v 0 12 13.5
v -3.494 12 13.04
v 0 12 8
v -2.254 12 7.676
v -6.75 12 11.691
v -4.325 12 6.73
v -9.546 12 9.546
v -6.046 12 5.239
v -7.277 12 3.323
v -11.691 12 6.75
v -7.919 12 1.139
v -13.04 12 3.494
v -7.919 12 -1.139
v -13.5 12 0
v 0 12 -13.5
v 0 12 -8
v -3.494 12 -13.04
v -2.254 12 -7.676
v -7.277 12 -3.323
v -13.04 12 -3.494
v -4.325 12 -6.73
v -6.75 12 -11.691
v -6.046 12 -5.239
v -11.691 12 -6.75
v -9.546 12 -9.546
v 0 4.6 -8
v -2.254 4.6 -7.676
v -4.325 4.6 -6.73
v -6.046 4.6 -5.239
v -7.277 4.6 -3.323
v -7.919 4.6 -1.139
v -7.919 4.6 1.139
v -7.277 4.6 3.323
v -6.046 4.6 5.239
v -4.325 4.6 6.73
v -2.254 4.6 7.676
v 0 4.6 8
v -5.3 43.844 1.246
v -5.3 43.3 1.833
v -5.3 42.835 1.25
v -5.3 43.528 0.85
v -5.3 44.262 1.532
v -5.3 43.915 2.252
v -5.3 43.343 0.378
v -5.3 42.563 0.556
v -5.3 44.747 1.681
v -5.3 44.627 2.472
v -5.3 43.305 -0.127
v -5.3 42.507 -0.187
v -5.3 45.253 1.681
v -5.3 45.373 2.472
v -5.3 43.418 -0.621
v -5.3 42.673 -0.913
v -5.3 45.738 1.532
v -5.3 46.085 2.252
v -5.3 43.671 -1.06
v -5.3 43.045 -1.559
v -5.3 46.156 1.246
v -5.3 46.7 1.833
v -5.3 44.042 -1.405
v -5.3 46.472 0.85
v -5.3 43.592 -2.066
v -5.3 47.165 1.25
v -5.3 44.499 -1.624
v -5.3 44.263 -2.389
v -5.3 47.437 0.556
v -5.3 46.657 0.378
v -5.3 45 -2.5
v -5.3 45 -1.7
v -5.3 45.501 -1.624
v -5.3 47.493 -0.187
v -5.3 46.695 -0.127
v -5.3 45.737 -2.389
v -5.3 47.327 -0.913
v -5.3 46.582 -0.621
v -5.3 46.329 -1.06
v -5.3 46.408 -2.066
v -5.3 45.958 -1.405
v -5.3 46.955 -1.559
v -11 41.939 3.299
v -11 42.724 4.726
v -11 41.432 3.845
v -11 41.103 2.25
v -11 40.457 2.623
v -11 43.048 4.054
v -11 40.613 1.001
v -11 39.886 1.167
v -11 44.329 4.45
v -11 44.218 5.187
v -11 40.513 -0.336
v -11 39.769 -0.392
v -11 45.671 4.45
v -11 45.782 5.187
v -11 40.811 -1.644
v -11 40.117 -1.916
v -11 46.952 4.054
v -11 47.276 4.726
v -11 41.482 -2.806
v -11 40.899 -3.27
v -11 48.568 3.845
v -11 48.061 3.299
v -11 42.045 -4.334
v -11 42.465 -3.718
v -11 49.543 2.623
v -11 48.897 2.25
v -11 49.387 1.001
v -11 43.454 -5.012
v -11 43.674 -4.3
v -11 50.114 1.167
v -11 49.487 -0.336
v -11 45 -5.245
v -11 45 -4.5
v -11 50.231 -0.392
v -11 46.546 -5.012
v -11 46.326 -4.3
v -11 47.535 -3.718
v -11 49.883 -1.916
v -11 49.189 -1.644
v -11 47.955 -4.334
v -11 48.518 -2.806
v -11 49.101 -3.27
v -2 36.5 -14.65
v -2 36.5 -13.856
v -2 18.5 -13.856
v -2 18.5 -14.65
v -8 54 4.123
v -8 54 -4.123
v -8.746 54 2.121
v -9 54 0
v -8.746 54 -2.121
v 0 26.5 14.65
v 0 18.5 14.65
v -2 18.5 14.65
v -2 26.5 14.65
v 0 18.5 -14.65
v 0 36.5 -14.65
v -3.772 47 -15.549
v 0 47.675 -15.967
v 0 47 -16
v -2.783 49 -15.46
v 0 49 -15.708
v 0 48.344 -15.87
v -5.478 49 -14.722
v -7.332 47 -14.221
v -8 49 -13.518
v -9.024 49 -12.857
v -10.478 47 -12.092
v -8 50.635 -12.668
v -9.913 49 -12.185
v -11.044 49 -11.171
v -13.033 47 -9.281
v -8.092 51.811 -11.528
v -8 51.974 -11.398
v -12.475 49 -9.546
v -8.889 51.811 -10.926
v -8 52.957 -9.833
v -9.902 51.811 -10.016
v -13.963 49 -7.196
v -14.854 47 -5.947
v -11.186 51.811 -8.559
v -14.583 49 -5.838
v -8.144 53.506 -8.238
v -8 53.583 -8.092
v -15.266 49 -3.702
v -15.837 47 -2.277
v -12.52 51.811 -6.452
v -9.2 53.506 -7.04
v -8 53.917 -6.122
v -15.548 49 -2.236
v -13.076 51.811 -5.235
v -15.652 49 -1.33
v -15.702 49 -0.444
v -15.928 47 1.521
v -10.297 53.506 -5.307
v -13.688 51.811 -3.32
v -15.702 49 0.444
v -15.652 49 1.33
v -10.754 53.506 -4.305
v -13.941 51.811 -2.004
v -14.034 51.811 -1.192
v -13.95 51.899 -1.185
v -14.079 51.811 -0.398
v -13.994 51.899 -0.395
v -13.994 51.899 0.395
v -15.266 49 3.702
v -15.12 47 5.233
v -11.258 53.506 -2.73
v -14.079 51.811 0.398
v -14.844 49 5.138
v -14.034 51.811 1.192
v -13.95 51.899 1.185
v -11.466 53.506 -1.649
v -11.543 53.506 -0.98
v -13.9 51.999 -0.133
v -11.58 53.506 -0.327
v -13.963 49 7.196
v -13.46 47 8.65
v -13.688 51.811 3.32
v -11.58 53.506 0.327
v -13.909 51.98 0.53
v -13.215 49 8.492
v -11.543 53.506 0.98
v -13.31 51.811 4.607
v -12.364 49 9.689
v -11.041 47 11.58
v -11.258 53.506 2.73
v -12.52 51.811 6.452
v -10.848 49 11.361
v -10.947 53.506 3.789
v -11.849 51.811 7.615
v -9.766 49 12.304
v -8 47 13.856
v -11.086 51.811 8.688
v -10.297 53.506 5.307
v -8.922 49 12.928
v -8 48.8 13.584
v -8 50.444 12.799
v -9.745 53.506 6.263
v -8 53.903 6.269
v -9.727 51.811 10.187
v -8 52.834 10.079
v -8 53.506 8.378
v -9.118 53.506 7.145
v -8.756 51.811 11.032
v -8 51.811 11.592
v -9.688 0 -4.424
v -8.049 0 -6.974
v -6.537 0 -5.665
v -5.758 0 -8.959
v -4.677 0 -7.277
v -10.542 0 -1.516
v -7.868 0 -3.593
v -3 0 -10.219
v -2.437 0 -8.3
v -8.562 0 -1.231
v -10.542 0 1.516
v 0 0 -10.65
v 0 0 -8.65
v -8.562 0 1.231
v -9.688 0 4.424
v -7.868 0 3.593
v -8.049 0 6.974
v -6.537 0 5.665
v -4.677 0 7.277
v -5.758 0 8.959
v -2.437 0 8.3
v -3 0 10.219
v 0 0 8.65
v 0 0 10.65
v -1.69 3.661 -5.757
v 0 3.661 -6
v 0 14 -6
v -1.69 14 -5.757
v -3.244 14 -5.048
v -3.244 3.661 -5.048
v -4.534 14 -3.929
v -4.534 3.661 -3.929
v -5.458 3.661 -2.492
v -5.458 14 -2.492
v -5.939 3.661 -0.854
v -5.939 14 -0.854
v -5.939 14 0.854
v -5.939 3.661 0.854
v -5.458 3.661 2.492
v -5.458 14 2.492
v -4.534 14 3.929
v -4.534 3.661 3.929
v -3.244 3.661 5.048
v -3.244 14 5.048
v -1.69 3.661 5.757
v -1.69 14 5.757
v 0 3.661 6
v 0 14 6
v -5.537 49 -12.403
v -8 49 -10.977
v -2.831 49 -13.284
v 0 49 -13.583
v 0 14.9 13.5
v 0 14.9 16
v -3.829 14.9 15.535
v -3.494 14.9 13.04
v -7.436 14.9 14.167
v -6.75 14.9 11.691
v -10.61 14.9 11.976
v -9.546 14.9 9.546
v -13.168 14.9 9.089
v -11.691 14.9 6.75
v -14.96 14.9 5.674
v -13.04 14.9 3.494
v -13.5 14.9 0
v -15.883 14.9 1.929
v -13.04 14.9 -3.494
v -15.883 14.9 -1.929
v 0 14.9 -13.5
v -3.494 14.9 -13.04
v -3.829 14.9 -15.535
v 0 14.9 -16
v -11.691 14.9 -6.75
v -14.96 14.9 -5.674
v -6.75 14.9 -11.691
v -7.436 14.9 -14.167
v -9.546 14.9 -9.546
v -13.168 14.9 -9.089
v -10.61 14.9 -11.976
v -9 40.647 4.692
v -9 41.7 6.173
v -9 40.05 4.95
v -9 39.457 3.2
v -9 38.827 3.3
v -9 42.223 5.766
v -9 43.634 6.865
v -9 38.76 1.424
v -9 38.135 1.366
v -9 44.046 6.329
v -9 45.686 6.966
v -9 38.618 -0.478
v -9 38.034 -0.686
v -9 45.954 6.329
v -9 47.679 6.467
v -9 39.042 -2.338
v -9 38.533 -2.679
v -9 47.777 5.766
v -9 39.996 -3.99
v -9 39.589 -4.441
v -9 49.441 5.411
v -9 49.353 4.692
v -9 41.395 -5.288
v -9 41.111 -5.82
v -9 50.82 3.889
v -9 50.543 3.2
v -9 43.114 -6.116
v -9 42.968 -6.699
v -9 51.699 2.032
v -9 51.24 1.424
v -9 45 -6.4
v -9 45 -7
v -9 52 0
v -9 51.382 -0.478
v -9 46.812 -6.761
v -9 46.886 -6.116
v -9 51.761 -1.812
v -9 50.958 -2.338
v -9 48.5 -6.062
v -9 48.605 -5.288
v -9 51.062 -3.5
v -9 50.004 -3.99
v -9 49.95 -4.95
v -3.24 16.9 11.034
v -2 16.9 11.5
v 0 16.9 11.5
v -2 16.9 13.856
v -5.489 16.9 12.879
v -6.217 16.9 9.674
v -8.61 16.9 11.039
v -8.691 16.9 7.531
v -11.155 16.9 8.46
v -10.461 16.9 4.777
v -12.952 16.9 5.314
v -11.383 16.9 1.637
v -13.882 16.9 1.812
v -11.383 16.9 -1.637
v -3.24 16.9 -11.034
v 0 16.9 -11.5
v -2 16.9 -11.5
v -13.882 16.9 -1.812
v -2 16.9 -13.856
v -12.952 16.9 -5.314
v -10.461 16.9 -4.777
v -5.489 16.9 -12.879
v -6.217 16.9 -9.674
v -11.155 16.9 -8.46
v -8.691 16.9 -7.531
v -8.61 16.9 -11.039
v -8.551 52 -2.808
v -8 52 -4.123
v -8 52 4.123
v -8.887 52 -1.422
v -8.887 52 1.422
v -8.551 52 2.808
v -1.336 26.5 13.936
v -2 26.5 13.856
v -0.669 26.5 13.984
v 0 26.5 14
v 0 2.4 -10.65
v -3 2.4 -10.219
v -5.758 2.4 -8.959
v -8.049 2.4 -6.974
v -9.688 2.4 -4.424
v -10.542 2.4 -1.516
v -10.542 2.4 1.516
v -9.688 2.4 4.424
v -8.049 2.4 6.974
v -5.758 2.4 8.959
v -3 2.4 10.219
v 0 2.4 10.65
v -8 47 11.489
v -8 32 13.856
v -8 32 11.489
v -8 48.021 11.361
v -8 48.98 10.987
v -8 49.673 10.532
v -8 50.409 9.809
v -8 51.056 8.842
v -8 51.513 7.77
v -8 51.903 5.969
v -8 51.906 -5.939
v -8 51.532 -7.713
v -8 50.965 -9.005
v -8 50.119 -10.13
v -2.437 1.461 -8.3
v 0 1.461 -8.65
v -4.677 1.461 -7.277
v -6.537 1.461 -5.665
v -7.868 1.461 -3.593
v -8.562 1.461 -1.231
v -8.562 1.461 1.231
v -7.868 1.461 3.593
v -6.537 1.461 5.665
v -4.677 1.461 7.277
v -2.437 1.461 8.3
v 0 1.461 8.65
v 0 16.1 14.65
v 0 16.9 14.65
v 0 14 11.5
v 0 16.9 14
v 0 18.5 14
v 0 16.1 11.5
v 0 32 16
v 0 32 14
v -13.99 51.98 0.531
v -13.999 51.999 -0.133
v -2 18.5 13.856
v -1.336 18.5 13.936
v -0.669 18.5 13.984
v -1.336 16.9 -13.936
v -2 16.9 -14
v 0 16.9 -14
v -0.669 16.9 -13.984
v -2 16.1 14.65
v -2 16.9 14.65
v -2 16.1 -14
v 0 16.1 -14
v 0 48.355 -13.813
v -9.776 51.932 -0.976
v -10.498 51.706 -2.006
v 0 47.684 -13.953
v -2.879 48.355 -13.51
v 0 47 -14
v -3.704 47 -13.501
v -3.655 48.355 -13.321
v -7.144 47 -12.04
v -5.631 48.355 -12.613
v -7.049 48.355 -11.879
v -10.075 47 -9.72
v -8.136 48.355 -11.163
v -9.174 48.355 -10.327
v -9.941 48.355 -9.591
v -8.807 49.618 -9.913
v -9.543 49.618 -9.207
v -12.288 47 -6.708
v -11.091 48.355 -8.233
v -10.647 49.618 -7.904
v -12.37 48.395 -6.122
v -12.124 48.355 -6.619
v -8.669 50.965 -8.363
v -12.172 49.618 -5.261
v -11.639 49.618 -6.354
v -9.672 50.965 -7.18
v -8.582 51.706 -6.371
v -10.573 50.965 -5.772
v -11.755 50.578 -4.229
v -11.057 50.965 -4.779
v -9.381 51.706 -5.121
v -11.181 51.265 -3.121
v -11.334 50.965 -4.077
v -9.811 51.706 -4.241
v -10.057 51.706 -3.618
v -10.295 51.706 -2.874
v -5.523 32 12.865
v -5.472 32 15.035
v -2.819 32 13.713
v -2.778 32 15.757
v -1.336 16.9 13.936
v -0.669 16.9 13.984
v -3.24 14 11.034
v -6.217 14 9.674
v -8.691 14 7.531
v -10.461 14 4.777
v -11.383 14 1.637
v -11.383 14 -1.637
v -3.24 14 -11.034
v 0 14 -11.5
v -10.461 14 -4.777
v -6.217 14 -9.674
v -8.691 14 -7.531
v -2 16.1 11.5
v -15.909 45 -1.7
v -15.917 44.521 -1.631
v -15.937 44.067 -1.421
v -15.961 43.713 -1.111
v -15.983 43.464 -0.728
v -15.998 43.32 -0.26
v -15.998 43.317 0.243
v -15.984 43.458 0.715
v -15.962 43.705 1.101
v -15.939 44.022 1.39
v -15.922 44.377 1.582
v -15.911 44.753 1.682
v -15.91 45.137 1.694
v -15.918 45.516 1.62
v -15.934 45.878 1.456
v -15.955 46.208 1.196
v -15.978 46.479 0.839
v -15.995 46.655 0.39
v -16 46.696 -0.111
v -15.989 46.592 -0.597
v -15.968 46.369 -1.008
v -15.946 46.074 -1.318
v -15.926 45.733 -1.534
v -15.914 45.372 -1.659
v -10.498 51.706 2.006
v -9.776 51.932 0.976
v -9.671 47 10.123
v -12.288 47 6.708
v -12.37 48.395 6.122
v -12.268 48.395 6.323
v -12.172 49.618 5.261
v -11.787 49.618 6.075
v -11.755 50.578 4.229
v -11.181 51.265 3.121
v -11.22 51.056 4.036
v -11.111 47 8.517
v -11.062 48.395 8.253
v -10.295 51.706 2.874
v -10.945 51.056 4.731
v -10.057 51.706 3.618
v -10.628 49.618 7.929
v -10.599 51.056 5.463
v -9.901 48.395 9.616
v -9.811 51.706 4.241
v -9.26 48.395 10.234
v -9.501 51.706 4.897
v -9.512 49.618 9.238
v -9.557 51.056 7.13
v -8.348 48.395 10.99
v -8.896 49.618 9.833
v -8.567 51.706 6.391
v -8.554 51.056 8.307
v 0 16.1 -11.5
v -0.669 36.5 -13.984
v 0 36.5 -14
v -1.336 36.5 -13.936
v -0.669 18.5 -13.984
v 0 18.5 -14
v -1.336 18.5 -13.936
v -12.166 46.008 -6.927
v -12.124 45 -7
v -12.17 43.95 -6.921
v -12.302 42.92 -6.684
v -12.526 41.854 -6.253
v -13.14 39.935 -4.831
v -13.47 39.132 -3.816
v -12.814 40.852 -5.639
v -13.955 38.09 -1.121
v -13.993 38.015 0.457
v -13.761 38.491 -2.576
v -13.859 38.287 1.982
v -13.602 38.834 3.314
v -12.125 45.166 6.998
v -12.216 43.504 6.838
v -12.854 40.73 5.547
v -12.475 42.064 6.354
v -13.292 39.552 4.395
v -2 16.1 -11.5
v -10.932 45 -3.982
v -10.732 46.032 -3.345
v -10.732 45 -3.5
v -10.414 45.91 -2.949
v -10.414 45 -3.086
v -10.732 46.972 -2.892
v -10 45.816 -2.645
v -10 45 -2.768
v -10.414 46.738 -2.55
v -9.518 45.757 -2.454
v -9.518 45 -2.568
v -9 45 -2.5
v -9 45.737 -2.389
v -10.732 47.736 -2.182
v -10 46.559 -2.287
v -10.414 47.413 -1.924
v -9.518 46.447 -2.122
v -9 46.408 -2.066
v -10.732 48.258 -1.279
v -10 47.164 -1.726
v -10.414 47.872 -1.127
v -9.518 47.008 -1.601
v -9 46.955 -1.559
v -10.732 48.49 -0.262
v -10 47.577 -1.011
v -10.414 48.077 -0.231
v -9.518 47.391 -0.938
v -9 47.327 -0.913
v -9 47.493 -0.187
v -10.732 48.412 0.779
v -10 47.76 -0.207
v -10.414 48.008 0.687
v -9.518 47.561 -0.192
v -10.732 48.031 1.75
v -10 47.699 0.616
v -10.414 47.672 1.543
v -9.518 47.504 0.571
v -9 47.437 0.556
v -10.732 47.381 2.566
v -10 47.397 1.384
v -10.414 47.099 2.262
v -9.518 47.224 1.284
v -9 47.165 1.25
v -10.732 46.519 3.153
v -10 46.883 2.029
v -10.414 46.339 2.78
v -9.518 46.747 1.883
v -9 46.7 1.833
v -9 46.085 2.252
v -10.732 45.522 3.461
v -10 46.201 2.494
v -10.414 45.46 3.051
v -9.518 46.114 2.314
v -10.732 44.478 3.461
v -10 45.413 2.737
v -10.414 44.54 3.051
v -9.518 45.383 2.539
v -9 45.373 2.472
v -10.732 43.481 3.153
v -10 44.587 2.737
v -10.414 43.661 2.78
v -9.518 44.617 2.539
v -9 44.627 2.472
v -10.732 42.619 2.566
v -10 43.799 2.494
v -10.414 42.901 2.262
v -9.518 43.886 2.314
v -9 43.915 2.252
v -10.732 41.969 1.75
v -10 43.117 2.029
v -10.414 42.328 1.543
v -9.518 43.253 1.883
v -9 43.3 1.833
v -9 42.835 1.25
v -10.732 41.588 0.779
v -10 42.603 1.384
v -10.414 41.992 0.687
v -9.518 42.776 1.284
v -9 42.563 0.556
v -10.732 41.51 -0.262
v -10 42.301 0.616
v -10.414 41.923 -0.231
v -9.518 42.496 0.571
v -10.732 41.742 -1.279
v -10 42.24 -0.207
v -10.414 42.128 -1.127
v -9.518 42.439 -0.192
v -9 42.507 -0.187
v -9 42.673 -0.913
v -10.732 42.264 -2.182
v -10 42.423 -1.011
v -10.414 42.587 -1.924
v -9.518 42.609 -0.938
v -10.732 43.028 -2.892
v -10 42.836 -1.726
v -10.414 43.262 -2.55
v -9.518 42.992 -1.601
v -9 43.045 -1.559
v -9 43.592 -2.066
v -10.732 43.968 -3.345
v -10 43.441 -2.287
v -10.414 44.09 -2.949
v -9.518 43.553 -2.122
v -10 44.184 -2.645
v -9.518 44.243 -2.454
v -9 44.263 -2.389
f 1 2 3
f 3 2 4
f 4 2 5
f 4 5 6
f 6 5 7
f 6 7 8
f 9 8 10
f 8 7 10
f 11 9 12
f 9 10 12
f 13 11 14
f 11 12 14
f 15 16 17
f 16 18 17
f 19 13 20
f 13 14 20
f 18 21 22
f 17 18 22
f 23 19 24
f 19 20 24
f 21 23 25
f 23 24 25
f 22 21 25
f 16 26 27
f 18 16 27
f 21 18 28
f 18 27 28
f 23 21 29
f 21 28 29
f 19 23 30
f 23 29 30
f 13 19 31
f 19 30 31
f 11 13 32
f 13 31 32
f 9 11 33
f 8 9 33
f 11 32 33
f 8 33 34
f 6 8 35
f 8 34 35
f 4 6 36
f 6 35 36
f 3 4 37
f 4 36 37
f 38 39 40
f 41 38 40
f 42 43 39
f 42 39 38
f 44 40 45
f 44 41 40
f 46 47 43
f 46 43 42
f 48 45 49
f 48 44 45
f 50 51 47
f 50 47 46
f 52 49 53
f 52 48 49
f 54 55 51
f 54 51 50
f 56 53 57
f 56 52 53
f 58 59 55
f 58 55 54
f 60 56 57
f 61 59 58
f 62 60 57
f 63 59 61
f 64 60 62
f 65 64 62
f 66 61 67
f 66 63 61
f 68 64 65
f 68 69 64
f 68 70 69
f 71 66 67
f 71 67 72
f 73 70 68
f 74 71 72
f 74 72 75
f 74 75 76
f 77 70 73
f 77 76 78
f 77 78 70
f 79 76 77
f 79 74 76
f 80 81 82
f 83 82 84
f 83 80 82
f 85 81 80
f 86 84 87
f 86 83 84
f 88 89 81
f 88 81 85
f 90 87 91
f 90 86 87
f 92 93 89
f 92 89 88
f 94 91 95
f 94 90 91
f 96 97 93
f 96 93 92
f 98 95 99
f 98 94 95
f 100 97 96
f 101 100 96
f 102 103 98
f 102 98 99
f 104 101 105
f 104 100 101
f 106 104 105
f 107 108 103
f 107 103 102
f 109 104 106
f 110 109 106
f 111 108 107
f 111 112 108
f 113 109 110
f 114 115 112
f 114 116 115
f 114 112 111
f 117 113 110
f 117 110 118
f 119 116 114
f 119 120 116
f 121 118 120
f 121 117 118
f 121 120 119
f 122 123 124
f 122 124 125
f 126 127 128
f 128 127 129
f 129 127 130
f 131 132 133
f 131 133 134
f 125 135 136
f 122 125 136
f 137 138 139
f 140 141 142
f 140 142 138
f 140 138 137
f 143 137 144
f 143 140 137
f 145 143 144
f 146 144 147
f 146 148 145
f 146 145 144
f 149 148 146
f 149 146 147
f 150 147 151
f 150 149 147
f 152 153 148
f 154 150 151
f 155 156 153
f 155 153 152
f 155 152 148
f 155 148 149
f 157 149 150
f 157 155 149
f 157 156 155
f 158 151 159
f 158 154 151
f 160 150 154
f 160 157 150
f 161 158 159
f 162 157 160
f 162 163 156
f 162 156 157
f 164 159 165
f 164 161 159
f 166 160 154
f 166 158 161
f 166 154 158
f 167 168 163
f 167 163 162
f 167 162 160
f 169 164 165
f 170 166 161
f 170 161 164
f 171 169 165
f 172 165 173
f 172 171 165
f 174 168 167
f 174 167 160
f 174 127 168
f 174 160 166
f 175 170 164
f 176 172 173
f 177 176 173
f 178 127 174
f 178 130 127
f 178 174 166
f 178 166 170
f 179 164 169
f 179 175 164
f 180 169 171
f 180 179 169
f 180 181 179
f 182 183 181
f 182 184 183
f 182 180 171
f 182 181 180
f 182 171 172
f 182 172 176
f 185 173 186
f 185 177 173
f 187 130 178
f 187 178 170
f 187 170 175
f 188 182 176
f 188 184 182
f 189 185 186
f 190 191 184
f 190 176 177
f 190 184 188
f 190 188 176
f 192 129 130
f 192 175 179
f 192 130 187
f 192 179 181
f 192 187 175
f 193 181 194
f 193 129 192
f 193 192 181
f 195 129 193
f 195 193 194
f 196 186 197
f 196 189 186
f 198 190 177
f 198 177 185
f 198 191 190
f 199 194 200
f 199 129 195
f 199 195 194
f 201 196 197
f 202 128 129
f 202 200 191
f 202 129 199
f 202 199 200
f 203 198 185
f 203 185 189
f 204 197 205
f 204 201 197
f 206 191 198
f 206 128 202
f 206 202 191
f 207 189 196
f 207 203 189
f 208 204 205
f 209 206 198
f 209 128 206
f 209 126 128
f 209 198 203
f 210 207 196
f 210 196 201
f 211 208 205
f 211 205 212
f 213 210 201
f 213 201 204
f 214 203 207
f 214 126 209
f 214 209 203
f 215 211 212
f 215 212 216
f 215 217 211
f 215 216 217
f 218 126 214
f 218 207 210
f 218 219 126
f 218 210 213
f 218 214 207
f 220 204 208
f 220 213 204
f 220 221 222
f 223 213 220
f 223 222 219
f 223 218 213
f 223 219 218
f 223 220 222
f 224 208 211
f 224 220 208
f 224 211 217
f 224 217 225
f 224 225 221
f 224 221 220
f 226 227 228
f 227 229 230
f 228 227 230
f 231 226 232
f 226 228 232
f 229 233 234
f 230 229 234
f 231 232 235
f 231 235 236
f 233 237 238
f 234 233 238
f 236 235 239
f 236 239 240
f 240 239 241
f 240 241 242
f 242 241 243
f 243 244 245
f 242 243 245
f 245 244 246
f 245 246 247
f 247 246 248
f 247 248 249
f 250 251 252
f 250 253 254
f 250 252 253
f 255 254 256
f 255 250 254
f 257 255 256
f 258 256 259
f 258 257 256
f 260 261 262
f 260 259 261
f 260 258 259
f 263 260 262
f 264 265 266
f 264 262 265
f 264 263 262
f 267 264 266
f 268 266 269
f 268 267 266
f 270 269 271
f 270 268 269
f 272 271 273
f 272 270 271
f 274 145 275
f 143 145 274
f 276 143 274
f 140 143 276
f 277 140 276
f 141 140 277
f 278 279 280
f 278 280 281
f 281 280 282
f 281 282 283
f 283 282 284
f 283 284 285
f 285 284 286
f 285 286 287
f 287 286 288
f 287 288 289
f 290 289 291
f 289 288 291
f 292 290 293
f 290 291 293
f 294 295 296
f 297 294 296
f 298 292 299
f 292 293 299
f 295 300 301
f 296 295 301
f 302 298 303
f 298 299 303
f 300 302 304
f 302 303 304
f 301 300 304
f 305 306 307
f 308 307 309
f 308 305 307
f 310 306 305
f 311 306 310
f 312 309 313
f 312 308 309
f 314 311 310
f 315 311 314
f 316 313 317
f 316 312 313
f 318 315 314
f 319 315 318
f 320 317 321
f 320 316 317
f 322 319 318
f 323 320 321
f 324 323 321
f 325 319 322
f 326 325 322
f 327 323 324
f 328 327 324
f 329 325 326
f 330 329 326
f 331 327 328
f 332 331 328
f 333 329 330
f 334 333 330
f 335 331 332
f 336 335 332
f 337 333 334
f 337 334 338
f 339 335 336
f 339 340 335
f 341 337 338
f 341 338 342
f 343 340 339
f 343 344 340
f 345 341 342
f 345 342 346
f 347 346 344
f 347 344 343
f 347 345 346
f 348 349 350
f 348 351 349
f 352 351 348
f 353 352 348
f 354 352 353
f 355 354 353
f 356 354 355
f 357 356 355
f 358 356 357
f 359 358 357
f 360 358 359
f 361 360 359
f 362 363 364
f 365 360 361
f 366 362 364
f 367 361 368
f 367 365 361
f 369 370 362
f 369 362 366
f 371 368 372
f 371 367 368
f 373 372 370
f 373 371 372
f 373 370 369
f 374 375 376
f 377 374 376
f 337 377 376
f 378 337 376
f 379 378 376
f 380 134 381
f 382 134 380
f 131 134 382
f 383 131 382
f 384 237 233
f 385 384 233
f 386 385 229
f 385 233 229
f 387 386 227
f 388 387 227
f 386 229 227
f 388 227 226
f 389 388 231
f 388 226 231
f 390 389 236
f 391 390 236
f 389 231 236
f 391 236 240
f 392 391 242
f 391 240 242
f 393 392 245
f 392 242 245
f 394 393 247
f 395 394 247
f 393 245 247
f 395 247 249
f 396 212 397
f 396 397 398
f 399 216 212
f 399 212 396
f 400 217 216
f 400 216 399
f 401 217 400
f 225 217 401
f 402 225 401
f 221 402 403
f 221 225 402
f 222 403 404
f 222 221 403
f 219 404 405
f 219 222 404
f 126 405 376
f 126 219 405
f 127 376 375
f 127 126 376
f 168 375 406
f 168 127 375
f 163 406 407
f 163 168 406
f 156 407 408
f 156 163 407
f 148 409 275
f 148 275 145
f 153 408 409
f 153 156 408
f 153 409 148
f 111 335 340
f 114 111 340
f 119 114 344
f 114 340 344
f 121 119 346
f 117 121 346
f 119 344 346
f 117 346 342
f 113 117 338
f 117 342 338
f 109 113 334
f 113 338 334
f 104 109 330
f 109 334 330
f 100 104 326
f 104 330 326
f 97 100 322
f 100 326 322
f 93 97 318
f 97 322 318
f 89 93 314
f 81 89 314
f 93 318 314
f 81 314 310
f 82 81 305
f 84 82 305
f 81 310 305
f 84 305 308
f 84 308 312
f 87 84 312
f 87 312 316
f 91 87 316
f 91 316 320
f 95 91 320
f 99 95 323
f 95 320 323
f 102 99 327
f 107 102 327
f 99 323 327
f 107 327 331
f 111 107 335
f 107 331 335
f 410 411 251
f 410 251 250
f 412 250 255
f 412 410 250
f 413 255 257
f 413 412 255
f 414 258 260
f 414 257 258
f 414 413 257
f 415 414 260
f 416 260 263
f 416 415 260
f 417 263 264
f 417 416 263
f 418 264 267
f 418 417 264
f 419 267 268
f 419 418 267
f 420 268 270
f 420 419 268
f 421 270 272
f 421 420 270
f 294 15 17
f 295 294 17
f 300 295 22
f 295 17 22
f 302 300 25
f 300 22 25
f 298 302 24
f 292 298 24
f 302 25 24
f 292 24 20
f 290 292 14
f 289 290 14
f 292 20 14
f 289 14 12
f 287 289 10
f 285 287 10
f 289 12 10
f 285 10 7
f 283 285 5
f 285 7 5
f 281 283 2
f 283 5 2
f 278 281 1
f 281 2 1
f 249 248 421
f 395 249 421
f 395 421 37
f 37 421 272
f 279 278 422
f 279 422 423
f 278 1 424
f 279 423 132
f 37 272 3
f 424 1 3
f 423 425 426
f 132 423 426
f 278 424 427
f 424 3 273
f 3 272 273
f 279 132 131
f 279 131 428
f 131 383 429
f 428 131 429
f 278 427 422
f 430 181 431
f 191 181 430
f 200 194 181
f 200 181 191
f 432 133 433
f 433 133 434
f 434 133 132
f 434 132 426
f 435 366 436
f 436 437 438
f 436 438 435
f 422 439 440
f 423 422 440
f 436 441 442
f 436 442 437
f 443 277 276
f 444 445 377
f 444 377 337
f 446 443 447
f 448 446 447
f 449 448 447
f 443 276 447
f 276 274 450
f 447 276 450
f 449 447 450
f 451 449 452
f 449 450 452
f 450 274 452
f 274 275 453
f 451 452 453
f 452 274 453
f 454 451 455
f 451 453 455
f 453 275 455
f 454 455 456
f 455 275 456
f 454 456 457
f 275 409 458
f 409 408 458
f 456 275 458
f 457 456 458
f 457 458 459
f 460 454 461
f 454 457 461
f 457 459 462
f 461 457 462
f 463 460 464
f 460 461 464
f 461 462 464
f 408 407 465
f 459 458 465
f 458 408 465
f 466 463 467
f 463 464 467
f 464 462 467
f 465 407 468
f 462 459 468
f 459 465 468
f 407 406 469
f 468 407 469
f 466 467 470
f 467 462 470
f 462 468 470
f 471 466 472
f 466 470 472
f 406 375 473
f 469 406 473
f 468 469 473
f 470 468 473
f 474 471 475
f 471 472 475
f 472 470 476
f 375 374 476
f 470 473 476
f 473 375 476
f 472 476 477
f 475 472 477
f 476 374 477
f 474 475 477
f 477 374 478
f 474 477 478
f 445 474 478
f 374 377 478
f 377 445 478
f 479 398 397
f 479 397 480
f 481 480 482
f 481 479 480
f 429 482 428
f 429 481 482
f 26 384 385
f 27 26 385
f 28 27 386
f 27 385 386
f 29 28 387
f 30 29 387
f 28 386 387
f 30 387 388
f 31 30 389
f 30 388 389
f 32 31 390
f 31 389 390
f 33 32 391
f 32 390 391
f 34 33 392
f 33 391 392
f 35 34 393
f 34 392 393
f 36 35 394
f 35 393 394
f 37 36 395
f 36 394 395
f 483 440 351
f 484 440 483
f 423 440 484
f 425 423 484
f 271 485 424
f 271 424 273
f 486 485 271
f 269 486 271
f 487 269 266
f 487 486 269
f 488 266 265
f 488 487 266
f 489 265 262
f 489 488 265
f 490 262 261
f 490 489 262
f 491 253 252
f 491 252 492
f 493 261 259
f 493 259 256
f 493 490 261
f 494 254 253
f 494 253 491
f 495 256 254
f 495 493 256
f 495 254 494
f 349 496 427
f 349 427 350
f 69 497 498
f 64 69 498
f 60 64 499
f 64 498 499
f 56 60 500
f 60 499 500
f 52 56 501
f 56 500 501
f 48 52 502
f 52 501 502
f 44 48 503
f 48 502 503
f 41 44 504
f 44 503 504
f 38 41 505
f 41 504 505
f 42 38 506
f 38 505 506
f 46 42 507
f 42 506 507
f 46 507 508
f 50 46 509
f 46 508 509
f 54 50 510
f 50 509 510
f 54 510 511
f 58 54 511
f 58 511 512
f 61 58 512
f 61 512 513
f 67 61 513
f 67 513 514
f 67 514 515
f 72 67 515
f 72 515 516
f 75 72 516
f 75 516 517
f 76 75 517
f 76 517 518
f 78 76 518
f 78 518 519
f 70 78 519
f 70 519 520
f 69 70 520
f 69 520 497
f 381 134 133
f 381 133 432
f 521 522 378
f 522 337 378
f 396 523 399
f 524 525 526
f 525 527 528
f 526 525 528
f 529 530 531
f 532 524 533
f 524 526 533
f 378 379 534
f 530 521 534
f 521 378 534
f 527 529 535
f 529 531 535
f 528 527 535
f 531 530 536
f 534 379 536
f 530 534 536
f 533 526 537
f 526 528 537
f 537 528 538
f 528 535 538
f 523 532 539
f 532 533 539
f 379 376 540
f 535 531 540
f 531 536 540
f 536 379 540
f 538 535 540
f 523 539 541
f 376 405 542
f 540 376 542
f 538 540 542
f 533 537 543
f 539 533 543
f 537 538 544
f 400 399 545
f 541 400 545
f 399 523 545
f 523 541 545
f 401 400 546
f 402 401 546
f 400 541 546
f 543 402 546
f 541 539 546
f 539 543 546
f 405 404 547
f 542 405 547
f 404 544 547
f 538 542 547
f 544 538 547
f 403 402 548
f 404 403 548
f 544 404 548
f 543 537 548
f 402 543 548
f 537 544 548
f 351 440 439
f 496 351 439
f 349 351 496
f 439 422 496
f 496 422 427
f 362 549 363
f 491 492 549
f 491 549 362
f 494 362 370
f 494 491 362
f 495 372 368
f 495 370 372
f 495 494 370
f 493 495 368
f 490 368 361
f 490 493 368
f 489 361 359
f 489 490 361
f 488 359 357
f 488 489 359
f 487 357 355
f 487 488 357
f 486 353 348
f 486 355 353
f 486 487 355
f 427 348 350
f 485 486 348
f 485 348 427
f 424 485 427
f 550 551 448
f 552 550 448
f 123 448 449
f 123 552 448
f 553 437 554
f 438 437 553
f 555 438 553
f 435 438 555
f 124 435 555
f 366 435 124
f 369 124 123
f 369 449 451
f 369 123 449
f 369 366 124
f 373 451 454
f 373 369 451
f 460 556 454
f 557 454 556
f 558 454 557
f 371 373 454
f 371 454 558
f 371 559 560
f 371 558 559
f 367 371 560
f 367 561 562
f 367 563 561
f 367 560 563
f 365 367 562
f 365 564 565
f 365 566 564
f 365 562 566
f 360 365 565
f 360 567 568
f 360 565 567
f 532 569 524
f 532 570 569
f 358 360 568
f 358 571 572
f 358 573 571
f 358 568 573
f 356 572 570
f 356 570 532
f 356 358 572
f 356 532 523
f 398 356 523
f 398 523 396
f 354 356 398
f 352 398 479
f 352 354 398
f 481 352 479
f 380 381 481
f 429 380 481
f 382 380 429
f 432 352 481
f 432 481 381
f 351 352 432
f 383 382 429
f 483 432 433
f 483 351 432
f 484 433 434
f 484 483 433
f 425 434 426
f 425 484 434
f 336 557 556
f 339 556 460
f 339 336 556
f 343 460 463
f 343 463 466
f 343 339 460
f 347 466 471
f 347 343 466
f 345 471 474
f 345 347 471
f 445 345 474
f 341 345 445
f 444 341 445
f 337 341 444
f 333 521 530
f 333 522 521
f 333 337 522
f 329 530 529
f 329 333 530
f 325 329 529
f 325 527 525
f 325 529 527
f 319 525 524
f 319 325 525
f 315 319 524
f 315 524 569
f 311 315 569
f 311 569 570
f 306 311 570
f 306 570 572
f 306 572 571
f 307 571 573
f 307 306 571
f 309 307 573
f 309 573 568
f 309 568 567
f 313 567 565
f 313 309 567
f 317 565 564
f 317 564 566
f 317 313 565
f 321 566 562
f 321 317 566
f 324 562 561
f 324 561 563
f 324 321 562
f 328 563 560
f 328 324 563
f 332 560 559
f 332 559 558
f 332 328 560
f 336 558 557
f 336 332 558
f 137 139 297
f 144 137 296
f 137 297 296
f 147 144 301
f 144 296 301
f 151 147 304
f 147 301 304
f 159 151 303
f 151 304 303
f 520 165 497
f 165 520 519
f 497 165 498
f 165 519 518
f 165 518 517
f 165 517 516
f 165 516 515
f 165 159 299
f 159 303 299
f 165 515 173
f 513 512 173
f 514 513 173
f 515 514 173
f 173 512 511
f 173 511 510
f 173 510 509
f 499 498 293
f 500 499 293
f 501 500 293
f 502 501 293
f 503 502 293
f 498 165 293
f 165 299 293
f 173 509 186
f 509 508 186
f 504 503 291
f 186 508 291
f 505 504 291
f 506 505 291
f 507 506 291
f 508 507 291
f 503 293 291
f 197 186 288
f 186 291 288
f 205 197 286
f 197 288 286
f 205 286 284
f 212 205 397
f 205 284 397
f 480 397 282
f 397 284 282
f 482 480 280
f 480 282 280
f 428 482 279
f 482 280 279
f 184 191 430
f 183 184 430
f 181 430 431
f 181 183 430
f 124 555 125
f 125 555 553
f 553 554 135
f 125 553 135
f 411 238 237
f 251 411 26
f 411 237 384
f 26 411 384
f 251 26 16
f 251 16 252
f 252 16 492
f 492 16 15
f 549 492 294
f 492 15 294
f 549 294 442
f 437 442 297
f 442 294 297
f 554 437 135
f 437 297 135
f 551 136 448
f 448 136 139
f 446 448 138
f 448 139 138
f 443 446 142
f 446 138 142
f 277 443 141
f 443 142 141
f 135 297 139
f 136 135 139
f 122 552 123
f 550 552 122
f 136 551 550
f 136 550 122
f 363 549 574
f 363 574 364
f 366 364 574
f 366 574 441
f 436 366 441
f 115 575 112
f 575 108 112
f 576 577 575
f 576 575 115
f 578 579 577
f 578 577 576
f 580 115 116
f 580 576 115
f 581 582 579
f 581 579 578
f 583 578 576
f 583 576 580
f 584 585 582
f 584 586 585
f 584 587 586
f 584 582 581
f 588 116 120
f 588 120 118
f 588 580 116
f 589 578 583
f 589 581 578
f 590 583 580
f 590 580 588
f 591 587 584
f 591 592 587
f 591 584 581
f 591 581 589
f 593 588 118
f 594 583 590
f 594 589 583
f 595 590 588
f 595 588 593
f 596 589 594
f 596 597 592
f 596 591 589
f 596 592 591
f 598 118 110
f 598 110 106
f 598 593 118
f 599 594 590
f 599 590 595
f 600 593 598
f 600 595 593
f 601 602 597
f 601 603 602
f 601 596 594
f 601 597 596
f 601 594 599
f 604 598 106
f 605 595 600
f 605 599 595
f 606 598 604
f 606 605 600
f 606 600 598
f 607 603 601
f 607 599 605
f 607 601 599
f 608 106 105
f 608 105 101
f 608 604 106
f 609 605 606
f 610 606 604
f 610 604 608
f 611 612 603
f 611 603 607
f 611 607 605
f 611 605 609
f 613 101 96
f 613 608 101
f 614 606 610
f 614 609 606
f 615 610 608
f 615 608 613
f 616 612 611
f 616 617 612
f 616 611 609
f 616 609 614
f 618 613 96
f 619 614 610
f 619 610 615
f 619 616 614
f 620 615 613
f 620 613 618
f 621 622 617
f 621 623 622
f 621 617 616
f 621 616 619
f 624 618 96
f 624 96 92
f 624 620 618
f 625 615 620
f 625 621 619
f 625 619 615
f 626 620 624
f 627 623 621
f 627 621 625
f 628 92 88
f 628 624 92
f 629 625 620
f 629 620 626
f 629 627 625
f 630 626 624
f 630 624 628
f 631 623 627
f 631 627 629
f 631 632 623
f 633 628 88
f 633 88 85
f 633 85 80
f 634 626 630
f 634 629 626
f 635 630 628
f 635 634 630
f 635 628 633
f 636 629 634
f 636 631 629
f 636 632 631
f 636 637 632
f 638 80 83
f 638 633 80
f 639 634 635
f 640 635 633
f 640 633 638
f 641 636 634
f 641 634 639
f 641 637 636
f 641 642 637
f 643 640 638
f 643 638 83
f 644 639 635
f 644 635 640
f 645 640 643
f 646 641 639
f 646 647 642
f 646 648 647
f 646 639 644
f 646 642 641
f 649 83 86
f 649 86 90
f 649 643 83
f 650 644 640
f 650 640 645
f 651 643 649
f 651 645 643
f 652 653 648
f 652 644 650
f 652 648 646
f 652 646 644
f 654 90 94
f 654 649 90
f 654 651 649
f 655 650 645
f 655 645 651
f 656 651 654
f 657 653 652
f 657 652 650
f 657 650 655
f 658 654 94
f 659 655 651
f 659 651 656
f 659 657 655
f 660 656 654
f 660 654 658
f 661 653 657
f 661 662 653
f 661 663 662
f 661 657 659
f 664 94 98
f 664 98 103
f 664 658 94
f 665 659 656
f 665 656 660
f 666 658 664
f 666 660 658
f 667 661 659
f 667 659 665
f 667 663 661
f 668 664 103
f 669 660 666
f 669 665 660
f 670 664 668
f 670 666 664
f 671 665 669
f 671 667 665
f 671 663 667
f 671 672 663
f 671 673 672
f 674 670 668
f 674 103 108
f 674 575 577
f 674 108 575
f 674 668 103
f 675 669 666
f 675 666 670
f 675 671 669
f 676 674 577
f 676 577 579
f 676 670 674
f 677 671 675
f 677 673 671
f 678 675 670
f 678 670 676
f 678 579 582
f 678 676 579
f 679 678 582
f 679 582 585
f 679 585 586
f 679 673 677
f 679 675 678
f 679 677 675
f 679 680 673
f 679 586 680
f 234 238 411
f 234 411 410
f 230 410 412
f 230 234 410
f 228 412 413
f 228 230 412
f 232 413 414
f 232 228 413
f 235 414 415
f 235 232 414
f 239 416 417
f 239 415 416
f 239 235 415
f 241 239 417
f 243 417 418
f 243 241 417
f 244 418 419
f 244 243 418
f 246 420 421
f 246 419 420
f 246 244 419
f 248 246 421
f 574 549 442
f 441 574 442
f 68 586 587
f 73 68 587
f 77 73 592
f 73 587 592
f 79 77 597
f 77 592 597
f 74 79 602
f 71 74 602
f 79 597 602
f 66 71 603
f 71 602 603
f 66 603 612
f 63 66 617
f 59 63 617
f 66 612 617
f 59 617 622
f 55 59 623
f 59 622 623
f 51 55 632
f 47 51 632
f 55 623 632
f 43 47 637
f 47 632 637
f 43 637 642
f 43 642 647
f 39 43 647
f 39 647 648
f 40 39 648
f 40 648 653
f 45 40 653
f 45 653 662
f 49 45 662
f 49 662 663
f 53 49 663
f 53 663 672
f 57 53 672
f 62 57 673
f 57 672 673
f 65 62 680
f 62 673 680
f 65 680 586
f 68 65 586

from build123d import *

# Parameters (mm, degrees)
SKETCH_1_R               = 16
EXTRUDE_1_DEPTH          = 54
FILLET_1_R               = 7
SHELL_1_T                = -2
CUT_EXTRUDE_1_DEPTH      = 59.549124673
CUT_EXTRUDE_1_DEPTH_BACK = 59.549124673
SKETCH_3_W               = 17.994708596
SKETCH_3_H               = 55.587571792
SKETCH_4_W               = 8
SKETCH_4_H               = 16.979772428
CUT_EXTRUDE_3_DEPTH      = 22
SKETCH_5_W               = 8
SKETCH_5_H               = 16.394935261
CUT_EXTRUDE_4_DEPTH      = 5
EXTRUDE_2_REACH          = 59.035
EXTRUDE_2_END_RADIUS     = 14
SKETCH_6_R               = 7
SKETCH_8_R               = 6.4
CUT_EXTRUDE_6_DEPTH      = 2
CUT_EXTRUDE_6_DRAFT      = -30
SKETCH_10_W              = 0.8
SKETCH_10_H              = 8
SKETCH_10_W_2            = 3.15
SKETCH_10_H_2            = 0.8
SKETCH_10_W_3            = 2.5
SKETCH_10_H_3            = 18
CUT_EXTRUDE_7_DEPTH      = 2
EXTRUDE_3_DEPTH          = 3.7
EXTRUDE_3_DEPTH_BACK     = 2
SKETCH_7_R               = 2.5
HOLE_WIZARD_M3_1_D       = 3.4
FILLET_3_R               = 2


with BuildPart() as part:
    # 스케치1 → 보스-돌출1 (new body)
    with BuildSketch(Plane(origin=(0, 0, 0), x_dir=(1, 0, 0), z_dir=(0, 1, 0))):
        with Locations(Location((0, 0, 0), (0, 0, 270))):
            Circle(SKETCH_1_R)
    extrude(amount=EXTRUDE_1_DEPTH)

    # 스케치2 → 컷-회전1 (revolve, cut)
    with BuildSketch(Plane.XY, mode=Mode.PRIVATE) as cut_revolve_1_sk:
        Polygon((19.244798042, 14.9), (13.5, 14.9), (13.5, 12), (8, 12), (8, 4.6), (10.65, 2.4), (10.65, 0), (19.244798042, 0), align=None)
    revolve(cut_revolve_1_sk.sketch.rotate(Axis((0, 0, 0), (0, 1, 0)), 90), axis=Axis((0, 0, 0), (0, 1, 0)), mode=Mode.SUBTRACT)

    # 필렛1
    fillet_1_edges = [part.edges().sort_by_distance(p)[0] for p in [
        (0, 54, -16),
    ]]
    fillet(fillet_1_edges, radius=FILLET_1_R)

    # 쉘1
    shell_1_openings = [part.faces().sort_by_distance(p)[0] for p in [
        (0, 0, 0),
    ]]
    offset(amount=SHELL_1_T, openings=shell_1_openings, kind=Kind.INTERSECTION)

    # 스케치3 → 컷-돌출1 (cut, two sides: drawn at the far end of the back side and taken through both)
    with BuildSketch(Plane.XY.offset(-CUT_EXTRUDE_1_DEPTH_BACK)):
        with Locations((8.997354298, 27.793785896)):
            Rectangle(SKETCH_3_W, SKETCH_3_H)
    extrude(amount=CUT_EXTRUDE_1_DEPTH + CUT_EXTRUDE_1_DEPTH_BACK, mode=Mode.SUBTRACT)

    # 스케치4 → 컷-돌출3 (cut)
    with BuildSketch(Plane(origin=(0, 54, 0), x_dir=(1, 0, 0), z_dir=(0, 1, 0))):
        with Locations((-4, -8.489886214)):
            Rectangle(SKETCH_4_W, SKETCH_4_H)
    extrude(amount=-CUT_EXTRUDE_3_DEPTH, mode=Mode.SUBTRACT)

    # 스케치5 → 컷-돌출4 (cut)
    with BuildSketch(Plane(origin=(0, 54, 0), x_dir=(1, 0, 0), z_dir=(0, 1, 0))):
        with Locations((-4, 8.197467631)):
            Rectangle(SKETCH_5_W, SKETCH_5_H)
    extrude(amount=-CUT_EXTRUDE_4_DEPTH, mode=Mode.SUBTRACT)

    # 보스-돌출2: up to this cylinder (the profile starts inside it)
    extrude_2_end = Plane(origin=(0, 45, 0), z_dir=(0, -1, 0)) * Cylinder(EXTRUDE_2_END_RADIUS, 147.07, mode=Mode.PRIVATE)
    # 스케치6 → 보스-돌출2 (add, up to the surface)
    with BuildSketch(Plane(origin=(-9, 0, 0), x_dir=(0, 0, -1), z_dir=(1, 0, 0)), mode=Mode.PRIVATE) as extrude_2_sk1:
        with Locations((0, 45)):
            Circle(SKETCH_6_R)
    extrude_2_tool1 = extrude(extrude_2_sk1.sketch, amount=-EXTRUDE_2_REACH, mode=Mode.PRIVATE) & extrude_2_end
    add(extrude_2_tool1.solids().sort_by_distance((-9, 45, 0))[0])


with BuildPart() as cut_extrude_6_tool:
    # 스케치8 → 컷-돌출6 (with draft: the straight prism first)
    with BuildSketch(Plane(origin=(-9, 0, 0), x_dir=(0, 0, -1), z_dir=(1, 0, 0))):
        with Locations((0, 45)):
            Circle(SKETCH_8_R)
    extrude(amount=-CUT_EXTRUDE_6_DEPTH)
    # 컷-돌출6: the draft: its side faces are tilted about the plane it starts from
    cut_extrude_6_sides = [cut_extrude_6_tool.faces().sort_by_distance(p)[0] for p in [
        (-10, 45, 6.4),
    ]]
    draft(cut_extrude_6_sides, Plane(origin=(-9, 0, 0), x_dir=(0, 0, -1), z_dir=(1, 0, 0)), CUT_EXTRUDE_6_DRAFT)


with BuildPart() as part_1:
    add(part.part)

    # 컷-돌출6: cut by cut_extrude_6_tool
    add(cut_extrude_6_tool.part, mode=Mode.SUBTRACT)

    # 스케치10 → 컷-돌출7 (cut)
    with BuildSketch(Plane(origin=(0, 0, 0), x_dir=(0, 0, -1), z_dir=(1, 0, 0))):
        with Locations((-14.25, 22.5)):
            Rectangle(SKETCH_10_W, SKETCH_10_H)
        with Locations((-13.075, 16.5)):
            Rectangle(SKETCH_10_W_2, SKETCH_10_H_2)
        with Locations((12.75, 16.5)):
            Rectangle(SKETCH_10_W_3, SKETCH_10_H_2)
        with Locations((14.25, 27.5)):
            Rectangle(SKETCH_10_W, SKETCH_10_H_3)
    extrude(amount=-CUT_EXTRUDE_7_DEPTH, mode=Mode.SUBTRACT)

    # 스케치7 → 보스-돌출3 (add, two sides: drawn at the far end of the back side and taken through both)
    with BuildSketch(Plane(origin=(-9, 0, 0), x_dir=(0, 0, -1), z_dir=(1, 0, 0)).offset(-EXTRUDE_3_DEPTH_BACK)):
        with Locations((0, 45)):
            Circle(SKETCH_7_R)
    extrude(amount=EXTRUDE_3_DEPTH + EXTRUDE_3_DEPTH_BACK)

    # M3 여유 구멍1 (through all)
    with Locations(Plane(origin=(-5.3, 45, 0), x_dir=(0, 0, 1), z_dir=(1, 0, 0))):
        with Locations((0, 0)):
            Hole(HOLE_WIZARD_M3_1_D / 2)

    # 필렛3
    fillet_3_edges = [part_1.edges().sort_by_distance(p)[0] for p in [
        (-11, 45, 2.5),
    ]]
    fillet(fillet_3_edges, radius=FILLET_3_R)


solid = part_1.part
